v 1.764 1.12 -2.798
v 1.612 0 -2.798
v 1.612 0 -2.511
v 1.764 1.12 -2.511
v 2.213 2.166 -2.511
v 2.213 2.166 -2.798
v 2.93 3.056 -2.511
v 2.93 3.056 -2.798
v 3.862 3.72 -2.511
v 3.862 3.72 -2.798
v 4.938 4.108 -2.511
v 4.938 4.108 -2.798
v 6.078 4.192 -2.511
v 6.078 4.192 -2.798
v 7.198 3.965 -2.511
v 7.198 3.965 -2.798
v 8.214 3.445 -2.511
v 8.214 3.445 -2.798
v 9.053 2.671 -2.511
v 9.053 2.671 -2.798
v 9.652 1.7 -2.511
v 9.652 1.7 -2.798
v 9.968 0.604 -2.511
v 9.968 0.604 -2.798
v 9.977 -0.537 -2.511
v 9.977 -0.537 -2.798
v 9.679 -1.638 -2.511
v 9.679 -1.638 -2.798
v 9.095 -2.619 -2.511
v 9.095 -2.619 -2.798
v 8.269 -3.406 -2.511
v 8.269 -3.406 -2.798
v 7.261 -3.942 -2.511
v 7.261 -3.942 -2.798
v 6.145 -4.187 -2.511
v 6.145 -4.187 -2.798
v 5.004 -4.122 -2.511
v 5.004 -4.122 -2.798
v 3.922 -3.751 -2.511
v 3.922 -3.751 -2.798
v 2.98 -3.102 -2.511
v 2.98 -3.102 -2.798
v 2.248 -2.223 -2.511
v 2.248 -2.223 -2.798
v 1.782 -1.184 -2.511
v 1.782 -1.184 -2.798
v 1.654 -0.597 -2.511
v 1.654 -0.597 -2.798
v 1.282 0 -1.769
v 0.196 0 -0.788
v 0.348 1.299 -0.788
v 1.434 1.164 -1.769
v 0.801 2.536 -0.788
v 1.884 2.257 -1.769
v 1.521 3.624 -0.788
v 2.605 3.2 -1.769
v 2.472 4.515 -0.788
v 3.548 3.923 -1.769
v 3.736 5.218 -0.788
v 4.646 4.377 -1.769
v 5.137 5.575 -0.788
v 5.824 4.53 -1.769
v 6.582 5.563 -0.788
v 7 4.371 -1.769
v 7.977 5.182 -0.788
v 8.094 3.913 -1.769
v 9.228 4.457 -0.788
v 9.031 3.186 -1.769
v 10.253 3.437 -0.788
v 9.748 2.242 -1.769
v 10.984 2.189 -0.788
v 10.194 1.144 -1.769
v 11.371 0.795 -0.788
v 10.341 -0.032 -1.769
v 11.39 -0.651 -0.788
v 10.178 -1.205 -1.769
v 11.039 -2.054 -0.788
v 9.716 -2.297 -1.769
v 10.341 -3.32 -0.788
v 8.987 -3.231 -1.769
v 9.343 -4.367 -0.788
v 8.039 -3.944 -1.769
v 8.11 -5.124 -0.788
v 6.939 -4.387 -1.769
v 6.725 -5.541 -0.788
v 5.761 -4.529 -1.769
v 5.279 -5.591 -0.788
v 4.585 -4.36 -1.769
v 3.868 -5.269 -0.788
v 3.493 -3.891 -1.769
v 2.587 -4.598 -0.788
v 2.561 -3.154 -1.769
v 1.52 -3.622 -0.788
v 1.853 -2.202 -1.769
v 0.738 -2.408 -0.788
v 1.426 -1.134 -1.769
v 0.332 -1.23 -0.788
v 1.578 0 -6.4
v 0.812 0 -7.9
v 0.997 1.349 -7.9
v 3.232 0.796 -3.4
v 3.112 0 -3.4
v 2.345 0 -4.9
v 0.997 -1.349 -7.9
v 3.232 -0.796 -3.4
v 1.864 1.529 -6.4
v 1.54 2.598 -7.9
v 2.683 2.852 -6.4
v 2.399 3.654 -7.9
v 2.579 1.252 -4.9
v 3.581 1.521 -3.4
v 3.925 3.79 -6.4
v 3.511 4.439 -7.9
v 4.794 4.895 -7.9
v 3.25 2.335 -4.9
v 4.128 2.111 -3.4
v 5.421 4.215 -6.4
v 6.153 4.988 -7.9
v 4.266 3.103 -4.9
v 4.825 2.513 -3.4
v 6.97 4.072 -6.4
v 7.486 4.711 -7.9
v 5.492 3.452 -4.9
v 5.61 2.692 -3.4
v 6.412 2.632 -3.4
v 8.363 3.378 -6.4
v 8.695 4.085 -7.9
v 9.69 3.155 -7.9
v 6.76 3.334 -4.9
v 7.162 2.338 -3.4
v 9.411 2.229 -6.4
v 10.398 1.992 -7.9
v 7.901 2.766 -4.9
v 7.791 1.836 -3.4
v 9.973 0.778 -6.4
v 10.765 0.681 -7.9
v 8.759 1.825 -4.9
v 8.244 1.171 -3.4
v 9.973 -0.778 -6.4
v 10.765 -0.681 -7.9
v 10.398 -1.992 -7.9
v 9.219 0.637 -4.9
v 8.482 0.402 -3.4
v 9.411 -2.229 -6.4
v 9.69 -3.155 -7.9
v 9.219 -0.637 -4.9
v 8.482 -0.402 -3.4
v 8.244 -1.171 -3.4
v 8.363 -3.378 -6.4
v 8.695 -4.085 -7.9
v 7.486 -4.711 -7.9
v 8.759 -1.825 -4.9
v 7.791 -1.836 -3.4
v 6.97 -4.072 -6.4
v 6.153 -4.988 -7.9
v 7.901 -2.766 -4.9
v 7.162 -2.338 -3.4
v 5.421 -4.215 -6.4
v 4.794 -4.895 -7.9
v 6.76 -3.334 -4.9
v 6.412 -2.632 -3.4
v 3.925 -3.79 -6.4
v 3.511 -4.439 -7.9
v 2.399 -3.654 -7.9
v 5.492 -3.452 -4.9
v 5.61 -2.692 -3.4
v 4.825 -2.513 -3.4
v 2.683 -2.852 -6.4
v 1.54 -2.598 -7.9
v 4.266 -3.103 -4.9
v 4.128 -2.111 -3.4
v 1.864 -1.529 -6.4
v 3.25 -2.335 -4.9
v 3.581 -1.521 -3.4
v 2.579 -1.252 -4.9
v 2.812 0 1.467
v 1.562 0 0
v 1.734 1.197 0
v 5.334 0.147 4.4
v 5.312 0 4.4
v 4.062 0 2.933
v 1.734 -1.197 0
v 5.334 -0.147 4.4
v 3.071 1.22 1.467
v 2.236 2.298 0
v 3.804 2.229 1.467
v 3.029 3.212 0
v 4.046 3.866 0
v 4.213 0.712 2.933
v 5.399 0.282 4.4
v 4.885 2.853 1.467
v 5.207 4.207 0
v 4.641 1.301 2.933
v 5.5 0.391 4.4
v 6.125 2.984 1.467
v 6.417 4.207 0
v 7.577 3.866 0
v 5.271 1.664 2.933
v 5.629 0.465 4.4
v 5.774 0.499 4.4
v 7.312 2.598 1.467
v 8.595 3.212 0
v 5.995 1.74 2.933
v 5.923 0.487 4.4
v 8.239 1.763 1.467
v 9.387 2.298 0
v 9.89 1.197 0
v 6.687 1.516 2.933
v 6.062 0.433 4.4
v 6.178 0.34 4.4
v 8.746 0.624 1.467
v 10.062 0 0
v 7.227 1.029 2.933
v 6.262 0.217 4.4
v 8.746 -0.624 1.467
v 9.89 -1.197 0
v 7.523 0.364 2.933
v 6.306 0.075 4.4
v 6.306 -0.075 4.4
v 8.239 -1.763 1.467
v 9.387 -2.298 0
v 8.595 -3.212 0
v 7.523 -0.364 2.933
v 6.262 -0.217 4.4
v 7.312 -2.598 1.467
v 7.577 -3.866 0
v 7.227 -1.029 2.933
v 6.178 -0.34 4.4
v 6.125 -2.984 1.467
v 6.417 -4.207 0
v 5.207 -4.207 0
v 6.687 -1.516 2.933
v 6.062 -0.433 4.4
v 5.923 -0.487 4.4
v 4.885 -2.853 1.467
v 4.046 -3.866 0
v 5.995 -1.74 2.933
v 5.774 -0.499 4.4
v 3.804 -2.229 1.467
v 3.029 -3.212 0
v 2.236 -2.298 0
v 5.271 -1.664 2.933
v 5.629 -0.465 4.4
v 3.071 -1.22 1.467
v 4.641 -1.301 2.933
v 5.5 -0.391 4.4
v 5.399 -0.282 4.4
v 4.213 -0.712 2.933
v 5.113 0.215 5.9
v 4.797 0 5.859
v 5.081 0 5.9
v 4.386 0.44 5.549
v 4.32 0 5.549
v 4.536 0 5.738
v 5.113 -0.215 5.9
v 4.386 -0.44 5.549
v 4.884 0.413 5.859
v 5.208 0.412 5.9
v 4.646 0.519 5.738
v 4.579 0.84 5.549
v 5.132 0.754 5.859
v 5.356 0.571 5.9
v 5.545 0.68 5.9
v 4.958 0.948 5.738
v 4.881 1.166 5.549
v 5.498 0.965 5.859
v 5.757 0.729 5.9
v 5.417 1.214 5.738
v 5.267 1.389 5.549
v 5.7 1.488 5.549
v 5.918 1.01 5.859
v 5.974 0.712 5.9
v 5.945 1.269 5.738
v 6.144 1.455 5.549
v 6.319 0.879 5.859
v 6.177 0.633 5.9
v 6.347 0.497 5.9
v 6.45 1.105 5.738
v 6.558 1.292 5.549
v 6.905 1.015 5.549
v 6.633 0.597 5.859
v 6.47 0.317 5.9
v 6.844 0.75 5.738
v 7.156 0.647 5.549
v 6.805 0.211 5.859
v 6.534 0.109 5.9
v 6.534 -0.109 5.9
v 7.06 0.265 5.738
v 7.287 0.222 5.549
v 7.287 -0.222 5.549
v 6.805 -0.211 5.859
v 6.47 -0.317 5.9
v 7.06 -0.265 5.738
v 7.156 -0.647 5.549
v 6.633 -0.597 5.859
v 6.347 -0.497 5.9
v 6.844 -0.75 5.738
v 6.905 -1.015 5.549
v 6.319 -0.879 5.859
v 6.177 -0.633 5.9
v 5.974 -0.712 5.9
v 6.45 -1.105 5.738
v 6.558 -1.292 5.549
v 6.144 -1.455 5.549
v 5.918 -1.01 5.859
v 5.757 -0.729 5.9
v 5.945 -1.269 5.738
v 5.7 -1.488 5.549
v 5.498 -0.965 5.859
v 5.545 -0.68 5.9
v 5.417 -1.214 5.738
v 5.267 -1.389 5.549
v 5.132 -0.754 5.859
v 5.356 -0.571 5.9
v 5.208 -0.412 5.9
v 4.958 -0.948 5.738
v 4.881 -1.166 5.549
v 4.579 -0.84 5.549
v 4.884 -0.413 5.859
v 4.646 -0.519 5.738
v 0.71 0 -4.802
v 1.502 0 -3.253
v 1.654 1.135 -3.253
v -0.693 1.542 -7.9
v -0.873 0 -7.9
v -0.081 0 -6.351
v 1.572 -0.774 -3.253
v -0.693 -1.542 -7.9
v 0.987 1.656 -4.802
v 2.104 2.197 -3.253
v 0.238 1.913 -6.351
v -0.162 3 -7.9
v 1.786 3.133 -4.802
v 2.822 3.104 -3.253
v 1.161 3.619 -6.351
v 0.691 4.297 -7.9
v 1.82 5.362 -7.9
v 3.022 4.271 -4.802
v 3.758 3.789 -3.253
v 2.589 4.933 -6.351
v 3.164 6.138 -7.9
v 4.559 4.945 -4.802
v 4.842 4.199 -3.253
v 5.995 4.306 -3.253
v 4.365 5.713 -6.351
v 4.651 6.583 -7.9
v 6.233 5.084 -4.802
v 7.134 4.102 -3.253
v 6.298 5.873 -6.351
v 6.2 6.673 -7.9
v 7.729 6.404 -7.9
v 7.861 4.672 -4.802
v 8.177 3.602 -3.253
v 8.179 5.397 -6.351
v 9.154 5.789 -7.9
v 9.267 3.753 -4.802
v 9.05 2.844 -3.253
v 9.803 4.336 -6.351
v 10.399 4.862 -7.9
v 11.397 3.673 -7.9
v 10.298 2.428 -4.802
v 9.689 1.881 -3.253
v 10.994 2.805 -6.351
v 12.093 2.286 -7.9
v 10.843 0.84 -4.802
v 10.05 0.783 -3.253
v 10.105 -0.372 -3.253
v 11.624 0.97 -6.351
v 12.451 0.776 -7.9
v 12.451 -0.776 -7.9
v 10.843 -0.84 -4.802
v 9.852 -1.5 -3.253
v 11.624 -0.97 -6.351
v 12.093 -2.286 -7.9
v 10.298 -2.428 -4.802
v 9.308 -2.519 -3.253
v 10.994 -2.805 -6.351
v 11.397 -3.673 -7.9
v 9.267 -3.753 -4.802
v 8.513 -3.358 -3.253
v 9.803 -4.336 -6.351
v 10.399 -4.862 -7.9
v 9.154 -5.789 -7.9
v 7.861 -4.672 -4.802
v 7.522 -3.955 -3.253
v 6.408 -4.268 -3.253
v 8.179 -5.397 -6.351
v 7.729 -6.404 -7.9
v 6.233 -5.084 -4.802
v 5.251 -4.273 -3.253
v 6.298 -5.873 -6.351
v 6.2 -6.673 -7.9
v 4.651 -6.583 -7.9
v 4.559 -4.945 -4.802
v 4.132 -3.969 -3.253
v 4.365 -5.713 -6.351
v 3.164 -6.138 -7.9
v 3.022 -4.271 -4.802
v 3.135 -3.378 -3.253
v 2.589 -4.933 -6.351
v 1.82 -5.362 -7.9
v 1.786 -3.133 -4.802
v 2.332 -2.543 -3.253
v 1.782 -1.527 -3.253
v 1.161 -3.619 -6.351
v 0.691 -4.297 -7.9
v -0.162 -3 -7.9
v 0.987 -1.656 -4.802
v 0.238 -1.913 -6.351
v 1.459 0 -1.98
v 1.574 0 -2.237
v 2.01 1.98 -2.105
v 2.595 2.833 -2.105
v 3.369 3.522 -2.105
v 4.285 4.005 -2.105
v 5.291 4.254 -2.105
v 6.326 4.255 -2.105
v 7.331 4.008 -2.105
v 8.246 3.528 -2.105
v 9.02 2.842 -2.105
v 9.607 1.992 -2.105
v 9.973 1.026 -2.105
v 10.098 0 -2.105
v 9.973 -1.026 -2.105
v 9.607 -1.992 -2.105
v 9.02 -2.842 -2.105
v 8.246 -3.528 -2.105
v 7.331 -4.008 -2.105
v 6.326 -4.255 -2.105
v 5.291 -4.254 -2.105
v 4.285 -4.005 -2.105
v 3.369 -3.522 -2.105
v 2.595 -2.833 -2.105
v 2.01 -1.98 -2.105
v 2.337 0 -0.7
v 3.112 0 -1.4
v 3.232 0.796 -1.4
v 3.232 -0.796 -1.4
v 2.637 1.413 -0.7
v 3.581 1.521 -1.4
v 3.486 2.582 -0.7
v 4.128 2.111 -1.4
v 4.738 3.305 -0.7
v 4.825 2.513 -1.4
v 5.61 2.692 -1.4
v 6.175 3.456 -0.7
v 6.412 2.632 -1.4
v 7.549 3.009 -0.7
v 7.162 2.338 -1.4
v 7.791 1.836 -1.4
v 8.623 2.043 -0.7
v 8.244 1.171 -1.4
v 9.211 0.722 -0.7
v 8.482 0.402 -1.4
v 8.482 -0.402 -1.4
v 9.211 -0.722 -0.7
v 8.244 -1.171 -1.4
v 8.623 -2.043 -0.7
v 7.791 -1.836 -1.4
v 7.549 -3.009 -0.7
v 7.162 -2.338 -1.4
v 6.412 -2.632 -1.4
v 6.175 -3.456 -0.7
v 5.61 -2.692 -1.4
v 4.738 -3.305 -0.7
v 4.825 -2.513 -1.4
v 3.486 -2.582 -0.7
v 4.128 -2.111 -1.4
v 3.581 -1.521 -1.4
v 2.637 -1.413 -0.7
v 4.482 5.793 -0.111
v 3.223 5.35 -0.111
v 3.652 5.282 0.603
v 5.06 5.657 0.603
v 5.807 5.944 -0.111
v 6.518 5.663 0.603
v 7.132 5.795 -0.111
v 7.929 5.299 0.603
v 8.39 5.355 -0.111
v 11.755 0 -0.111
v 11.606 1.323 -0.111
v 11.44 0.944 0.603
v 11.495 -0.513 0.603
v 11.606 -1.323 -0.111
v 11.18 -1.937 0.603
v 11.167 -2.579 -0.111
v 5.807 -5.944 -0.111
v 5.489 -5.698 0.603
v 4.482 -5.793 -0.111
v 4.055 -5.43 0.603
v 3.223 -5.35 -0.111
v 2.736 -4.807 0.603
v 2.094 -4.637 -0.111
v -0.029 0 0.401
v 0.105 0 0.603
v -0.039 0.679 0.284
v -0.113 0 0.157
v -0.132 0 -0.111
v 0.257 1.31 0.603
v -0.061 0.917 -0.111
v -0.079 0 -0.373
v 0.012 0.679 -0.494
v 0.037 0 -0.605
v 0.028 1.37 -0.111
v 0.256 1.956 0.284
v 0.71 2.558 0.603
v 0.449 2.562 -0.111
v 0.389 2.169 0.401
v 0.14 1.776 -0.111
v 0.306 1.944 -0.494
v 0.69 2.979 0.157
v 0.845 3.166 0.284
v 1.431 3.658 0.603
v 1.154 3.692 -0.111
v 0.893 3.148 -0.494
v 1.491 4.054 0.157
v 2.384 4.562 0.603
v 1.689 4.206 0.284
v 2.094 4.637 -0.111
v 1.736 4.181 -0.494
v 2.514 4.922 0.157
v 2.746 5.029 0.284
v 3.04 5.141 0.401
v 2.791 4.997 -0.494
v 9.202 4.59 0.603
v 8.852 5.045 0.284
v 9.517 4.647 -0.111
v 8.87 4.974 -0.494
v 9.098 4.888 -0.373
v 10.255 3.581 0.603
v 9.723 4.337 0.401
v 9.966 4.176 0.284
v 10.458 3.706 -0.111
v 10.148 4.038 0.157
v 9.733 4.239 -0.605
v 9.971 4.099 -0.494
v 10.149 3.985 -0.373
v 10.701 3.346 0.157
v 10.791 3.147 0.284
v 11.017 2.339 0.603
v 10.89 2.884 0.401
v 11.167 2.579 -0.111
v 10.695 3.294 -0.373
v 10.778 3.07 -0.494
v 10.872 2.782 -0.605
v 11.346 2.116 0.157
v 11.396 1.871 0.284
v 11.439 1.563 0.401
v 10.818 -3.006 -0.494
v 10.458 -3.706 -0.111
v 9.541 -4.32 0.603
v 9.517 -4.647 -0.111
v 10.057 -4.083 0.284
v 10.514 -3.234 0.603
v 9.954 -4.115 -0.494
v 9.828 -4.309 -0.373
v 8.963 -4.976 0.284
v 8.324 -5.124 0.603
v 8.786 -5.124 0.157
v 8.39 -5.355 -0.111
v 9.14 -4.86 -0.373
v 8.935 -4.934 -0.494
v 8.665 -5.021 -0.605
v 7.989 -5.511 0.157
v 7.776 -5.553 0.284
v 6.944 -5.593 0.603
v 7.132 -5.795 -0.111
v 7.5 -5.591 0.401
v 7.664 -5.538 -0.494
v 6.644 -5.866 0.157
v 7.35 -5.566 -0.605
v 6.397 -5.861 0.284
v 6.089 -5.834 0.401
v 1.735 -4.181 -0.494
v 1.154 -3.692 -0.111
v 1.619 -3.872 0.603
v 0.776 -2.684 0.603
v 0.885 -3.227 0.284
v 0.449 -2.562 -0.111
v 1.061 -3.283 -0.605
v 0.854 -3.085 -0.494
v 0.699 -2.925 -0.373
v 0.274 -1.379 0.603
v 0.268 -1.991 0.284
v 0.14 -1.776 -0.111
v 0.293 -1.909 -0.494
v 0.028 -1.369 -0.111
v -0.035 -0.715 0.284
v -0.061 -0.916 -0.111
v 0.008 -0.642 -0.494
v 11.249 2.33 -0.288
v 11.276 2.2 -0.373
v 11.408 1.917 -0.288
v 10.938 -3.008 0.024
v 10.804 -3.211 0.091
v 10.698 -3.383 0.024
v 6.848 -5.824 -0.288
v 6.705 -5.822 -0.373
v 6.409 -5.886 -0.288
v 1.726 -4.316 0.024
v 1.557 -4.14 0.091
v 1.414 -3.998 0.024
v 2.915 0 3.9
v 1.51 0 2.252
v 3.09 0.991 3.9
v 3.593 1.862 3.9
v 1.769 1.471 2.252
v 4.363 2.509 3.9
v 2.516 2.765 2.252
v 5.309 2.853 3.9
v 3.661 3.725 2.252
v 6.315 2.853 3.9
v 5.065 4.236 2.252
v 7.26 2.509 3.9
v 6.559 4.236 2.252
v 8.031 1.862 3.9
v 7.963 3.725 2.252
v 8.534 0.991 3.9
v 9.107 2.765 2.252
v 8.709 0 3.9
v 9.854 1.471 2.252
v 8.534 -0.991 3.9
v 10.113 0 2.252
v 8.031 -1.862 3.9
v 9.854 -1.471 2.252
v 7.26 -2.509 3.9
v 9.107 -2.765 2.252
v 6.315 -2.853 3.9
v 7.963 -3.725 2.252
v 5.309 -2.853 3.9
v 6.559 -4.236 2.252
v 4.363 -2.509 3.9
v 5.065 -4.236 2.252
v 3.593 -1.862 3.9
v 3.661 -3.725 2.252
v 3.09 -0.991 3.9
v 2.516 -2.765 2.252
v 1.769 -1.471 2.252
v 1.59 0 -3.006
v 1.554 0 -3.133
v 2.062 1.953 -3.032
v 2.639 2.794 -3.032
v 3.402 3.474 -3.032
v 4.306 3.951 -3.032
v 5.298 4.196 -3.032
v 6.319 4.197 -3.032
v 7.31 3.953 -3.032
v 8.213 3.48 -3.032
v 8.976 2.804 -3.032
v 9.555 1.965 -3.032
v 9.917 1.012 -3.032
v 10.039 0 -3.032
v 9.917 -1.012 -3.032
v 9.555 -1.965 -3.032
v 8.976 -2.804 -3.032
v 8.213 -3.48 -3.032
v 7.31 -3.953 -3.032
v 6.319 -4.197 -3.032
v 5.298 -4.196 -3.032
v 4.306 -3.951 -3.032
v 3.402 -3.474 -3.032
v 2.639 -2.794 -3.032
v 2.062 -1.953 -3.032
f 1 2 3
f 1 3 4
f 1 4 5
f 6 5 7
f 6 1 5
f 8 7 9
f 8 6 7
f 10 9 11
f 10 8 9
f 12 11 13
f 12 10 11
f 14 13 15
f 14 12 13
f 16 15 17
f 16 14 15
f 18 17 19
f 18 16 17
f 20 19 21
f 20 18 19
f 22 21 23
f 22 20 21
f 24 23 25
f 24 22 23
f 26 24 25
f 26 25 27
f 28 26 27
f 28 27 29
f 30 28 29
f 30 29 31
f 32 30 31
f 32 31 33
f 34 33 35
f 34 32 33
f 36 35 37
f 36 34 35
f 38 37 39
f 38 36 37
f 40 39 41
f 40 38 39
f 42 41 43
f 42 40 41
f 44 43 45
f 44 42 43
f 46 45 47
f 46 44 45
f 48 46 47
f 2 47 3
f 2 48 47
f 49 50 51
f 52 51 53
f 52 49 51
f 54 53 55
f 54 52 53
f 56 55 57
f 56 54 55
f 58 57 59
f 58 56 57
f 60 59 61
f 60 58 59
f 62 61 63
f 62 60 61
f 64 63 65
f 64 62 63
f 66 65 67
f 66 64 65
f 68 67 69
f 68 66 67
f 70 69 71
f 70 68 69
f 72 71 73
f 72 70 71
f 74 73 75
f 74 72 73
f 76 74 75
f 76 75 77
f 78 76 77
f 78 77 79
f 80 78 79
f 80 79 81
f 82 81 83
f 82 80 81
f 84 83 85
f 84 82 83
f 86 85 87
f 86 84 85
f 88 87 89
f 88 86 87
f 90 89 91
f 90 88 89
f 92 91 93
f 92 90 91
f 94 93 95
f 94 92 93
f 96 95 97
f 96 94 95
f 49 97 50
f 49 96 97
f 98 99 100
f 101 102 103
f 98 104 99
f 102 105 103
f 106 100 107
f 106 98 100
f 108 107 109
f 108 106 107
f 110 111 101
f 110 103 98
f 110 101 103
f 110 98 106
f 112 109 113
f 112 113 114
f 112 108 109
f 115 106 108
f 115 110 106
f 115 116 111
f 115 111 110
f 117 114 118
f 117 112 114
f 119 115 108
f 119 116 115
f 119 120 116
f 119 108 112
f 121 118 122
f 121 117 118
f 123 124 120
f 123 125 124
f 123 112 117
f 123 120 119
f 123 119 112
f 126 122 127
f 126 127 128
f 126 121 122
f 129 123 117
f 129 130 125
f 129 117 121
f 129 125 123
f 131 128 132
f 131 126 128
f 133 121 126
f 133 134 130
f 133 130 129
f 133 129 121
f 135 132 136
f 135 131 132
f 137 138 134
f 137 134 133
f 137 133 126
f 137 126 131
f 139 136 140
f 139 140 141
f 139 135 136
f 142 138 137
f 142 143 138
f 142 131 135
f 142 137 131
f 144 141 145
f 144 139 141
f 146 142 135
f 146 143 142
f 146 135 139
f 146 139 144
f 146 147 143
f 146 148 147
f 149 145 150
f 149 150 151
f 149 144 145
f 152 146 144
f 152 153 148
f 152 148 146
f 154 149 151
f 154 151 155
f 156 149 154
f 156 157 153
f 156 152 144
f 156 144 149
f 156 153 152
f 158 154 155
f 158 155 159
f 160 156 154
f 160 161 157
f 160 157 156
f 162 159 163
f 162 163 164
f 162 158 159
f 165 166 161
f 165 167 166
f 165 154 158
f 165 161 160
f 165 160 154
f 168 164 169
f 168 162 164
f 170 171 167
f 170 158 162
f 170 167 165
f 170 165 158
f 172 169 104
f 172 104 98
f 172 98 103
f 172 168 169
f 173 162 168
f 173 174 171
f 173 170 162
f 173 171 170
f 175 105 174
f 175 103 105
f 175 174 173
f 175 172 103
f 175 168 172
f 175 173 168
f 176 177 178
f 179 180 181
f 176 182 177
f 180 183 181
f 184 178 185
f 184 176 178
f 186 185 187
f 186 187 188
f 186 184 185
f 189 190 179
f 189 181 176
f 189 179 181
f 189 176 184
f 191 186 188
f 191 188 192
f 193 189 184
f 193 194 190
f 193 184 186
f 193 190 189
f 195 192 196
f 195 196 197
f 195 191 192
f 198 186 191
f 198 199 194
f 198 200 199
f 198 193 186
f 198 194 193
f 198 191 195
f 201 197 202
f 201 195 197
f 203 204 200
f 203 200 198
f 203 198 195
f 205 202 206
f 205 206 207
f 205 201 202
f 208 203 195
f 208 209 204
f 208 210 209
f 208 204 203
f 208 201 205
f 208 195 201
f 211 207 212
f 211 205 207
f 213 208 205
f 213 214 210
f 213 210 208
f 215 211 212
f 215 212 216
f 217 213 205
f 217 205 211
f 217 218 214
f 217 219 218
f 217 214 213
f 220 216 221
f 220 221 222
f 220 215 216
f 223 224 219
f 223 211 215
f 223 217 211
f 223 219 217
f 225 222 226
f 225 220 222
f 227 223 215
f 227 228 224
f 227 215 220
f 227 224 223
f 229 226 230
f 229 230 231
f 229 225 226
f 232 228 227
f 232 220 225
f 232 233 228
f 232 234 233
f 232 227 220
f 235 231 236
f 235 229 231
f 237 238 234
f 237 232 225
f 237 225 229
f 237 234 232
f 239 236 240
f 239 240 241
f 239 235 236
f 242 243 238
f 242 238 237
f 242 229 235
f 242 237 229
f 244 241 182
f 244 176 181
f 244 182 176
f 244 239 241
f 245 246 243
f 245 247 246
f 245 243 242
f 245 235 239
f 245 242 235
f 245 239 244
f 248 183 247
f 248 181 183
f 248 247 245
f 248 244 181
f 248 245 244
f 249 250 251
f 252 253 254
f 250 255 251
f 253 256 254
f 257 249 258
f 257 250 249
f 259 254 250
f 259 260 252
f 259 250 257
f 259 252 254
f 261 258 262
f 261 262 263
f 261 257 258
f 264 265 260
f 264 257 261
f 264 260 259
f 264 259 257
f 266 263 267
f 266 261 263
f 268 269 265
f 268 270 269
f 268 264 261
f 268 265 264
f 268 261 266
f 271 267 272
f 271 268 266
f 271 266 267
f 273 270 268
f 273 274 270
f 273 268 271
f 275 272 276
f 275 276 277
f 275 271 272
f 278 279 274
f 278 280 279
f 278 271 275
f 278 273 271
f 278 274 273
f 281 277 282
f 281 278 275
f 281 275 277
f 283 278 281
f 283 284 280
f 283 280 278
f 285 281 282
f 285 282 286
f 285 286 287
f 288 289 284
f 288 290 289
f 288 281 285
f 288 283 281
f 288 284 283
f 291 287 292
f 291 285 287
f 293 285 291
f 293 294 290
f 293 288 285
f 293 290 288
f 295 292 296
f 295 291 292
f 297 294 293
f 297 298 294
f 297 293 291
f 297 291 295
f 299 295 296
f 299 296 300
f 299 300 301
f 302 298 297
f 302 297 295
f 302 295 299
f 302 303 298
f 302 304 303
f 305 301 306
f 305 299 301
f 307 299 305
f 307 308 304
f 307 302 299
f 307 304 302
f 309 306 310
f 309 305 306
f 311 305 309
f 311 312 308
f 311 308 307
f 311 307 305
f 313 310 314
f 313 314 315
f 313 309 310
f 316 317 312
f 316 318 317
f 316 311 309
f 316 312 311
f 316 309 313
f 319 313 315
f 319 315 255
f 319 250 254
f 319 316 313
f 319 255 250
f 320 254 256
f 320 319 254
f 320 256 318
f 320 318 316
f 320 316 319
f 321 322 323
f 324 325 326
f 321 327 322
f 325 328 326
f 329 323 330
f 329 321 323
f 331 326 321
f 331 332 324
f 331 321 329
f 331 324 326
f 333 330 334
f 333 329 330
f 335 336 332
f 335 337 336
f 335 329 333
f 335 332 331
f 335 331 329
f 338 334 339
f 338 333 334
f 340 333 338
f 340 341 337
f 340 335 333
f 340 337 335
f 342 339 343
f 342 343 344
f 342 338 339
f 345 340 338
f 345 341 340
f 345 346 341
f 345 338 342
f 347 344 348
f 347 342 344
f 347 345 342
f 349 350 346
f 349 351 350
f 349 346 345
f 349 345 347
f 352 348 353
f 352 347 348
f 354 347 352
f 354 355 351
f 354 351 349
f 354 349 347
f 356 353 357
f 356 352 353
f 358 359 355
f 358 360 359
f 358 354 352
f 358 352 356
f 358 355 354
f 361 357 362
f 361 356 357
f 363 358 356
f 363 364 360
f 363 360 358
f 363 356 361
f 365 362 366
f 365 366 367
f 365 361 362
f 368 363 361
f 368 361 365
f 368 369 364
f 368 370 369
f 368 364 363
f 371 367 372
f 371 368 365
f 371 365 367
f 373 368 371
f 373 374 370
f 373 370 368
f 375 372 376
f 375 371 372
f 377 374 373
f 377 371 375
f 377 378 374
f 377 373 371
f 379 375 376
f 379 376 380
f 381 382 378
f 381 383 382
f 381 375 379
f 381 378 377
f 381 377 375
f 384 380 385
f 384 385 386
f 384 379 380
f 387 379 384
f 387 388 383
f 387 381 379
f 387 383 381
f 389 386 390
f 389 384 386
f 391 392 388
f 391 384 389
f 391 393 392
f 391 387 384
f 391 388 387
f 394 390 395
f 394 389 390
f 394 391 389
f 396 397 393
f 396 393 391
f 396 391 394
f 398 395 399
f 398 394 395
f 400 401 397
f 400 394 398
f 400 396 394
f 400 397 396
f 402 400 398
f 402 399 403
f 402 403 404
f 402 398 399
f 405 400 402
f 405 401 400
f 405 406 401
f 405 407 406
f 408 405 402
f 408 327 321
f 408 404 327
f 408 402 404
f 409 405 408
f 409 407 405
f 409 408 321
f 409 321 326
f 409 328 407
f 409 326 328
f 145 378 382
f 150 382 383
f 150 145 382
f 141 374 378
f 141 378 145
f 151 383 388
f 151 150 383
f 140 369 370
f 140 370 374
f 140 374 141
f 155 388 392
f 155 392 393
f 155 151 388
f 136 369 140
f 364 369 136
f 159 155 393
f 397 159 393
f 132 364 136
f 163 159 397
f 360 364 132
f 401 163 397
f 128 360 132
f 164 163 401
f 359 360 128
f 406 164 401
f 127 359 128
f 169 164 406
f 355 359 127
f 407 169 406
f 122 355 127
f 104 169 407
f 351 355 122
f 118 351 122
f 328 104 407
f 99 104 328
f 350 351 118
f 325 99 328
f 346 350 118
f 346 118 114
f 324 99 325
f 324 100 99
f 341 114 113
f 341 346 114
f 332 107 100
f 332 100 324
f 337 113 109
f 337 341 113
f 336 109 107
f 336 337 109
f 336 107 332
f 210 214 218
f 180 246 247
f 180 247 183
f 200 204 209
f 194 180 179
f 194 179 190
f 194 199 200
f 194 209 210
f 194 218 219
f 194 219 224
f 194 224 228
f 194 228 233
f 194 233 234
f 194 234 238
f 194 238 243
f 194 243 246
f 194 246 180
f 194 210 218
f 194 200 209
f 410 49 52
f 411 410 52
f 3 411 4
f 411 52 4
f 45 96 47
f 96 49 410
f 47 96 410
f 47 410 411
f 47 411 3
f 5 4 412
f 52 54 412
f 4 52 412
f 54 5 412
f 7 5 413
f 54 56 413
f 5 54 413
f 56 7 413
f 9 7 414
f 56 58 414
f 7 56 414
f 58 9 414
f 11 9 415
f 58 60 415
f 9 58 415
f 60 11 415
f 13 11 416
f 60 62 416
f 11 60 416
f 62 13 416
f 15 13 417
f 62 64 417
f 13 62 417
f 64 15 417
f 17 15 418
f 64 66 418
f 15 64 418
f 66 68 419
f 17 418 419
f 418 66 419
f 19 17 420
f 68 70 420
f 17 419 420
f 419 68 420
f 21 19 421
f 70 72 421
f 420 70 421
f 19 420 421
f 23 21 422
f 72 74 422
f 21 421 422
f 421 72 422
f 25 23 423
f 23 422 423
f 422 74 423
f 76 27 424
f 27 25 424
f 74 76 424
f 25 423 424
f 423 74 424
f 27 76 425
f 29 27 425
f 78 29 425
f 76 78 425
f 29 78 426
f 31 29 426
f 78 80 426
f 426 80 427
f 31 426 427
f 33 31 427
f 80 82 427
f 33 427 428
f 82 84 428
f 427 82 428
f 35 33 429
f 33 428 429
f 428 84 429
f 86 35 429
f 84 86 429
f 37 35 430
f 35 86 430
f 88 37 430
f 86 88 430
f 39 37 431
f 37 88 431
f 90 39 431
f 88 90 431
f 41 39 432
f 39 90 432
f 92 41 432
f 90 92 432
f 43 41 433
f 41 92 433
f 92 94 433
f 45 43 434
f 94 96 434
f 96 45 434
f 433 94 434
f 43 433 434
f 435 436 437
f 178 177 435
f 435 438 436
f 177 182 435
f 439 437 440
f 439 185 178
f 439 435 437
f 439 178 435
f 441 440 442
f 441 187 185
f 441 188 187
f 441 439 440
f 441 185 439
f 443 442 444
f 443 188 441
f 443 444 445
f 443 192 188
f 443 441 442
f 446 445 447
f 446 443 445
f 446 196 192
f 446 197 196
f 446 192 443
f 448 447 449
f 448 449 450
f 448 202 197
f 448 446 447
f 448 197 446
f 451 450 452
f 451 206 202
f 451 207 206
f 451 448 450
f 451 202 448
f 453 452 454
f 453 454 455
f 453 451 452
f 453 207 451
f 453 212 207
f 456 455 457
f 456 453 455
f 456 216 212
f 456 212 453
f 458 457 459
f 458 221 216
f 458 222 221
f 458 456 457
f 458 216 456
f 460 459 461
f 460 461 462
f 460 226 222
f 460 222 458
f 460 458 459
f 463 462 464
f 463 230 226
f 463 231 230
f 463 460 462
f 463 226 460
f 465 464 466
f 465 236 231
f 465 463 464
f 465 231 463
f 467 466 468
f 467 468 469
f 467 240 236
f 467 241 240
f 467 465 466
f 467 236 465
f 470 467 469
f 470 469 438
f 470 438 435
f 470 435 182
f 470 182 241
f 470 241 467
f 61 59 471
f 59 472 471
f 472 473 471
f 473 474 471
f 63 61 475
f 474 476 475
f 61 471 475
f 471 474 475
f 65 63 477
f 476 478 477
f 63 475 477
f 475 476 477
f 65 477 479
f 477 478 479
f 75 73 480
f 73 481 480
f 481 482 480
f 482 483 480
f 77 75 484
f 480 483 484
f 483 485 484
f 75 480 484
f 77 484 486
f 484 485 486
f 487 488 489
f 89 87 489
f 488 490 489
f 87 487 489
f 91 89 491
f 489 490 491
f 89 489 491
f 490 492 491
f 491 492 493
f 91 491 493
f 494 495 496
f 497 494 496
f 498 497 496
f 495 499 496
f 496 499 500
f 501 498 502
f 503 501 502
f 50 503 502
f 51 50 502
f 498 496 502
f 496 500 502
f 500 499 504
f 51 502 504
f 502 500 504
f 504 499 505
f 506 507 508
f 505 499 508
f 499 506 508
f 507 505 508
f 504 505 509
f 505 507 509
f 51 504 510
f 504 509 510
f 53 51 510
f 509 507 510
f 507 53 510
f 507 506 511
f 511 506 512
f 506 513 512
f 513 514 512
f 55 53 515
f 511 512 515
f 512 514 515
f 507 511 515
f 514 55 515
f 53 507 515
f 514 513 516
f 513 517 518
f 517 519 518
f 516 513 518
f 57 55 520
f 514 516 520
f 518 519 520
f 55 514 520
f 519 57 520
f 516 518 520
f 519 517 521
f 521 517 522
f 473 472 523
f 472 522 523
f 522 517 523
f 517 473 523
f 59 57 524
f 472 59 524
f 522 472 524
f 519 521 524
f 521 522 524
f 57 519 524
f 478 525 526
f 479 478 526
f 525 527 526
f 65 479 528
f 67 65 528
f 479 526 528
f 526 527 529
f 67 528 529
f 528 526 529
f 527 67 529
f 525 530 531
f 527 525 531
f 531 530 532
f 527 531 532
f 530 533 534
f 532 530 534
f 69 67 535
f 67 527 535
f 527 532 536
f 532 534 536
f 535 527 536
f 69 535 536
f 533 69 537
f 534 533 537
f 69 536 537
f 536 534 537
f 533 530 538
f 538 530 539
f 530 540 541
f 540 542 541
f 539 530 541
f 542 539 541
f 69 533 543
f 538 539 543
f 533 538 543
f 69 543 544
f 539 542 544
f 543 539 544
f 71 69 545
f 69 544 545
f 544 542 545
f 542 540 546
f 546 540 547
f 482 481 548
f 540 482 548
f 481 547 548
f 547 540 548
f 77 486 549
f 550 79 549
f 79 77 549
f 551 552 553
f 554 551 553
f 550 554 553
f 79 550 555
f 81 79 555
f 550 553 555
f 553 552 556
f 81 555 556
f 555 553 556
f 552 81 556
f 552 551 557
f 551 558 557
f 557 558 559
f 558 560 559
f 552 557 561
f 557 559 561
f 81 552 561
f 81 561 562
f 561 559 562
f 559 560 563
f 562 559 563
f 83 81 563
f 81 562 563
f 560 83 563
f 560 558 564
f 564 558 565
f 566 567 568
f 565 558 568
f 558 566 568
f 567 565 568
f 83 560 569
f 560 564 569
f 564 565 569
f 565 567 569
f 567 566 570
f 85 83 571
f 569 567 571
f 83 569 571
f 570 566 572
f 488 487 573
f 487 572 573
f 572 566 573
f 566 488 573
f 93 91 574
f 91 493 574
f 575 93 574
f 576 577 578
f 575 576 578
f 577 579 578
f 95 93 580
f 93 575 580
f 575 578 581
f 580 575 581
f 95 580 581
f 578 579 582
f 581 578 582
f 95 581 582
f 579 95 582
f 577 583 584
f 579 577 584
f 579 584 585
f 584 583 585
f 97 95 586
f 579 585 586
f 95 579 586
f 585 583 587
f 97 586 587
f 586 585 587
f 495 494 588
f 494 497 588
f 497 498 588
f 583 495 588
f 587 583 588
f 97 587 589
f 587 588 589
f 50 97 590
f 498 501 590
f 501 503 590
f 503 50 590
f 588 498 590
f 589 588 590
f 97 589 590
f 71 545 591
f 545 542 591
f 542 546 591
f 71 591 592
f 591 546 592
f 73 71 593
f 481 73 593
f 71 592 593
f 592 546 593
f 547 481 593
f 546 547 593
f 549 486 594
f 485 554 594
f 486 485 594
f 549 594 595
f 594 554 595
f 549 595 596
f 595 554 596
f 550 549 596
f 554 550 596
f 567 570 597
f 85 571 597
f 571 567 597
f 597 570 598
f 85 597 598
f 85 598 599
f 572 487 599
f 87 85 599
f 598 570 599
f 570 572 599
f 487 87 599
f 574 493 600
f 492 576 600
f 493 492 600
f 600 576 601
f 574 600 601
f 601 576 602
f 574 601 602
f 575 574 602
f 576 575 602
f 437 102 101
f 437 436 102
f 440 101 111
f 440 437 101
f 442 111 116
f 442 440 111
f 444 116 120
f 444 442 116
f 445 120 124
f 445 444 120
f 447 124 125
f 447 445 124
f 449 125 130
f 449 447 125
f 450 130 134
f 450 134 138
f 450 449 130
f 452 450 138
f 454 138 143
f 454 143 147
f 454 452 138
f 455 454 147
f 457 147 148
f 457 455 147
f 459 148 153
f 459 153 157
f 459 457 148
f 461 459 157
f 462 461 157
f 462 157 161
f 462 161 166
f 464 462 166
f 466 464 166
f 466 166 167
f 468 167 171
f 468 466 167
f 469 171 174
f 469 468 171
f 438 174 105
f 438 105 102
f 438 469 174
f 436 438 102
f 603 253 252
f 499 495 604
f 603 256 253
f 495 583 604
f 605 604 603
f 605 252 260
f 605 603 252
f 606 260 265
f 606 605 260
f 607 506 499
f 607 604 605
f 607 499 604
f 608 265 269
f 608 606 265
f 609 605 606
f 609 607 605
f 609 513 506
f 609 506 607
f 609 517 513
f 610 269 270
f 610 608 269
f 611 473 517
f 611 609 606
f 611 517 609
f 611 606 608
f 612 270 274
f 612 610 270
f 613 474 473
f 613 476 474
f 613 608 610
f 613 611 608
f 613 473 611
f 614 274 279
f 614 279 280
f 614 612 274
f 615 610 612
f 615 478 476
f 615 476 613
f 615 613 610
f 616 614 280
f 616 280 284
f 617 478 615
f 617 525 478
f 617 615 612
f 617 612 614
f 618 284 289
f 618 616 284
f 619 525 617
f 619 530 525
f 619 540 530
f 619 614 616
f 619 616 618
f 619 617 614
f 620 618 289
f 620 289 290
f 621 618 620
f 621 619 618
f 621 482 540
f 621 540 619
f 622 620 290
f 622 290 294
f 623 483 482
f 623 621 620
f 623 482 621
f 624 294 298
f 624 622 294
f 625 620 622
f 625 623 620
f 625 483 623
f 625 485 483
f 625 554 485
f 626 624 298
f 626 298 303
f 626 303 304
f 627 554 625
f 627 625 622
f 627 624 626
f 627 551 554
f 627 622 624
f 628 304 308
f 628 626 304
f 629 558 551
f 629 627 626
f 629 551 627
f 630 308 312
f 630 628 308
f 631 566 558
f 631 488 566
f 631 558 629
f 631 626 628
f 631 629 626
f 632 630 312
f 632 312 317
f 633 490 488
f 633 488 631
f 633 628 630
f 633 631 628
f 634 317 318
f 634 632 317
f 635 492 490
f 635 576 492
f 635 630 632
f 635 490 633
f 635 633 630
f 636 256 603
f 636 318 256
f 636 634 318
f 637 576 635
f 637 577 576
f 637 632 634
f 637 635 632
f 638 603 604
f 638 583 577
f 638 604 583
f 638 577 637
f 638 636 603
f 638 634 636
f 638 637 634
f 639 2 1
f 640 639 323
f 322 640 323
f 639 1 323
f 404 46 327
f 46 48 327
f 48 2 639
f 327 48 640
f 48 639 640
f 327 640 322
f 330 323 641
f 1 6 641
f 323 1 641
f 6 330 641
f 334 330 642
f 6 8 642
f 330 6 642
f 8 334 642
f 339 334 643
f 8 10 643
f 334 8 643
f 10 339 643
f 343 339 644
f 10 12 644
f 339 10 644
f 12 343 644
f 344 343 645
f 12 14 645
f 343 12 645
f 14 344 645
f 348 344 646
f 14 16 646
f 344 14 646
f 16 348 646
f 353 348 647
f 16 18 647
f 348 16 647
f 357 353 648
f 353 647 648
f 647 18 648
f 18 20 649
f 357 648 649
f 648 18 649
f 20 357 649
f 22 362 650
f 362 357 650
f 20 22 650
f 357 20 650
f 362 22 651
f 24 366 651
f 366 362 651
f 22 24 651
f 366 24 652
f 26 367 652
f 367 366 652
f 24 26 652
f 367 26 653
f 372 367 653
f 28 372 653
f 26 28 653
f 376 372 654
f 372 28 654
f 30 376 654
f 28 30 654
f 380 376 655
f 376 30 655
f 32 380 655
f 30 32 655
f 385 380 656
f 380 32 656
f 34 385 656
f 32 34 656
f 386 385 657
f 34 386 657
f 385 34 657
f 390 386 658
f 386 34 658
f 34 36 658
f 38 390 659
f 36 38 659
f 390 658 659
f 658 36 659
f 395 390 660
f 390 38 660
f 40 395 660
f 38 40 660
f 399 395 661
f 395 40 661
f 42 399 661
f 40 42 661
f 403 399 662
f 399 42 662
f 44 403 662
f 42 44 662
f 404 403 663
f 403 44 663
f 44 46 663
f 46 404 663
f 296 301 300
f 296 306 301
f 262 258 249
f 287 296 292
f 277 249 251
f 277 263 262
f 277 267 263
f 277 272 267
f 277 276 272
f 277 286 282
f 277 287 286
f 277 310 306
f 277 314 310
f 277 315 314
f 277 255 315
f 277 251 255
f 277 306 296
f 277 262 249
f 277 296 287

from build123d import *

# Parameters (mm, degrees)
F2_R = 1


with BuildPart() as f1:
    # F0 (on Front) → F1 (revolve)
    with BuildSketch(Plane.XZ):
        Polygon((5.3116780147, 4.4), (5.8116780147, 4.4), (5.8116780147, 5.9), (4.6192167893, 5.9), (-0.5253184439, -0.1362546736), (1.6116780147, -2.0664450233), (1.6116780147, -3.0388837995), (-0.8728924878, -7.9), (0.8116780147, -7.9), (3.1116780147, -3.4), (3.1116780147, -1.4), (1.5616780147, 0), align=None)
    revolve(axis=Axis((5.8116780147, 0, 1.9449143492), (0, 0, -1)))

    # F2
    f2_edges = [f1.edges().sort_by_distance(p)[0] for p in [
        (12.148674, 0, -0.136255),
        (7.004139, 0, 5.9),
        (10.011678, 0, -2.066445),
        (10.011678, 0, -3.038884),
    ]]
    fillet(f2_edges, radius=F2_R)


solid = f1.part
